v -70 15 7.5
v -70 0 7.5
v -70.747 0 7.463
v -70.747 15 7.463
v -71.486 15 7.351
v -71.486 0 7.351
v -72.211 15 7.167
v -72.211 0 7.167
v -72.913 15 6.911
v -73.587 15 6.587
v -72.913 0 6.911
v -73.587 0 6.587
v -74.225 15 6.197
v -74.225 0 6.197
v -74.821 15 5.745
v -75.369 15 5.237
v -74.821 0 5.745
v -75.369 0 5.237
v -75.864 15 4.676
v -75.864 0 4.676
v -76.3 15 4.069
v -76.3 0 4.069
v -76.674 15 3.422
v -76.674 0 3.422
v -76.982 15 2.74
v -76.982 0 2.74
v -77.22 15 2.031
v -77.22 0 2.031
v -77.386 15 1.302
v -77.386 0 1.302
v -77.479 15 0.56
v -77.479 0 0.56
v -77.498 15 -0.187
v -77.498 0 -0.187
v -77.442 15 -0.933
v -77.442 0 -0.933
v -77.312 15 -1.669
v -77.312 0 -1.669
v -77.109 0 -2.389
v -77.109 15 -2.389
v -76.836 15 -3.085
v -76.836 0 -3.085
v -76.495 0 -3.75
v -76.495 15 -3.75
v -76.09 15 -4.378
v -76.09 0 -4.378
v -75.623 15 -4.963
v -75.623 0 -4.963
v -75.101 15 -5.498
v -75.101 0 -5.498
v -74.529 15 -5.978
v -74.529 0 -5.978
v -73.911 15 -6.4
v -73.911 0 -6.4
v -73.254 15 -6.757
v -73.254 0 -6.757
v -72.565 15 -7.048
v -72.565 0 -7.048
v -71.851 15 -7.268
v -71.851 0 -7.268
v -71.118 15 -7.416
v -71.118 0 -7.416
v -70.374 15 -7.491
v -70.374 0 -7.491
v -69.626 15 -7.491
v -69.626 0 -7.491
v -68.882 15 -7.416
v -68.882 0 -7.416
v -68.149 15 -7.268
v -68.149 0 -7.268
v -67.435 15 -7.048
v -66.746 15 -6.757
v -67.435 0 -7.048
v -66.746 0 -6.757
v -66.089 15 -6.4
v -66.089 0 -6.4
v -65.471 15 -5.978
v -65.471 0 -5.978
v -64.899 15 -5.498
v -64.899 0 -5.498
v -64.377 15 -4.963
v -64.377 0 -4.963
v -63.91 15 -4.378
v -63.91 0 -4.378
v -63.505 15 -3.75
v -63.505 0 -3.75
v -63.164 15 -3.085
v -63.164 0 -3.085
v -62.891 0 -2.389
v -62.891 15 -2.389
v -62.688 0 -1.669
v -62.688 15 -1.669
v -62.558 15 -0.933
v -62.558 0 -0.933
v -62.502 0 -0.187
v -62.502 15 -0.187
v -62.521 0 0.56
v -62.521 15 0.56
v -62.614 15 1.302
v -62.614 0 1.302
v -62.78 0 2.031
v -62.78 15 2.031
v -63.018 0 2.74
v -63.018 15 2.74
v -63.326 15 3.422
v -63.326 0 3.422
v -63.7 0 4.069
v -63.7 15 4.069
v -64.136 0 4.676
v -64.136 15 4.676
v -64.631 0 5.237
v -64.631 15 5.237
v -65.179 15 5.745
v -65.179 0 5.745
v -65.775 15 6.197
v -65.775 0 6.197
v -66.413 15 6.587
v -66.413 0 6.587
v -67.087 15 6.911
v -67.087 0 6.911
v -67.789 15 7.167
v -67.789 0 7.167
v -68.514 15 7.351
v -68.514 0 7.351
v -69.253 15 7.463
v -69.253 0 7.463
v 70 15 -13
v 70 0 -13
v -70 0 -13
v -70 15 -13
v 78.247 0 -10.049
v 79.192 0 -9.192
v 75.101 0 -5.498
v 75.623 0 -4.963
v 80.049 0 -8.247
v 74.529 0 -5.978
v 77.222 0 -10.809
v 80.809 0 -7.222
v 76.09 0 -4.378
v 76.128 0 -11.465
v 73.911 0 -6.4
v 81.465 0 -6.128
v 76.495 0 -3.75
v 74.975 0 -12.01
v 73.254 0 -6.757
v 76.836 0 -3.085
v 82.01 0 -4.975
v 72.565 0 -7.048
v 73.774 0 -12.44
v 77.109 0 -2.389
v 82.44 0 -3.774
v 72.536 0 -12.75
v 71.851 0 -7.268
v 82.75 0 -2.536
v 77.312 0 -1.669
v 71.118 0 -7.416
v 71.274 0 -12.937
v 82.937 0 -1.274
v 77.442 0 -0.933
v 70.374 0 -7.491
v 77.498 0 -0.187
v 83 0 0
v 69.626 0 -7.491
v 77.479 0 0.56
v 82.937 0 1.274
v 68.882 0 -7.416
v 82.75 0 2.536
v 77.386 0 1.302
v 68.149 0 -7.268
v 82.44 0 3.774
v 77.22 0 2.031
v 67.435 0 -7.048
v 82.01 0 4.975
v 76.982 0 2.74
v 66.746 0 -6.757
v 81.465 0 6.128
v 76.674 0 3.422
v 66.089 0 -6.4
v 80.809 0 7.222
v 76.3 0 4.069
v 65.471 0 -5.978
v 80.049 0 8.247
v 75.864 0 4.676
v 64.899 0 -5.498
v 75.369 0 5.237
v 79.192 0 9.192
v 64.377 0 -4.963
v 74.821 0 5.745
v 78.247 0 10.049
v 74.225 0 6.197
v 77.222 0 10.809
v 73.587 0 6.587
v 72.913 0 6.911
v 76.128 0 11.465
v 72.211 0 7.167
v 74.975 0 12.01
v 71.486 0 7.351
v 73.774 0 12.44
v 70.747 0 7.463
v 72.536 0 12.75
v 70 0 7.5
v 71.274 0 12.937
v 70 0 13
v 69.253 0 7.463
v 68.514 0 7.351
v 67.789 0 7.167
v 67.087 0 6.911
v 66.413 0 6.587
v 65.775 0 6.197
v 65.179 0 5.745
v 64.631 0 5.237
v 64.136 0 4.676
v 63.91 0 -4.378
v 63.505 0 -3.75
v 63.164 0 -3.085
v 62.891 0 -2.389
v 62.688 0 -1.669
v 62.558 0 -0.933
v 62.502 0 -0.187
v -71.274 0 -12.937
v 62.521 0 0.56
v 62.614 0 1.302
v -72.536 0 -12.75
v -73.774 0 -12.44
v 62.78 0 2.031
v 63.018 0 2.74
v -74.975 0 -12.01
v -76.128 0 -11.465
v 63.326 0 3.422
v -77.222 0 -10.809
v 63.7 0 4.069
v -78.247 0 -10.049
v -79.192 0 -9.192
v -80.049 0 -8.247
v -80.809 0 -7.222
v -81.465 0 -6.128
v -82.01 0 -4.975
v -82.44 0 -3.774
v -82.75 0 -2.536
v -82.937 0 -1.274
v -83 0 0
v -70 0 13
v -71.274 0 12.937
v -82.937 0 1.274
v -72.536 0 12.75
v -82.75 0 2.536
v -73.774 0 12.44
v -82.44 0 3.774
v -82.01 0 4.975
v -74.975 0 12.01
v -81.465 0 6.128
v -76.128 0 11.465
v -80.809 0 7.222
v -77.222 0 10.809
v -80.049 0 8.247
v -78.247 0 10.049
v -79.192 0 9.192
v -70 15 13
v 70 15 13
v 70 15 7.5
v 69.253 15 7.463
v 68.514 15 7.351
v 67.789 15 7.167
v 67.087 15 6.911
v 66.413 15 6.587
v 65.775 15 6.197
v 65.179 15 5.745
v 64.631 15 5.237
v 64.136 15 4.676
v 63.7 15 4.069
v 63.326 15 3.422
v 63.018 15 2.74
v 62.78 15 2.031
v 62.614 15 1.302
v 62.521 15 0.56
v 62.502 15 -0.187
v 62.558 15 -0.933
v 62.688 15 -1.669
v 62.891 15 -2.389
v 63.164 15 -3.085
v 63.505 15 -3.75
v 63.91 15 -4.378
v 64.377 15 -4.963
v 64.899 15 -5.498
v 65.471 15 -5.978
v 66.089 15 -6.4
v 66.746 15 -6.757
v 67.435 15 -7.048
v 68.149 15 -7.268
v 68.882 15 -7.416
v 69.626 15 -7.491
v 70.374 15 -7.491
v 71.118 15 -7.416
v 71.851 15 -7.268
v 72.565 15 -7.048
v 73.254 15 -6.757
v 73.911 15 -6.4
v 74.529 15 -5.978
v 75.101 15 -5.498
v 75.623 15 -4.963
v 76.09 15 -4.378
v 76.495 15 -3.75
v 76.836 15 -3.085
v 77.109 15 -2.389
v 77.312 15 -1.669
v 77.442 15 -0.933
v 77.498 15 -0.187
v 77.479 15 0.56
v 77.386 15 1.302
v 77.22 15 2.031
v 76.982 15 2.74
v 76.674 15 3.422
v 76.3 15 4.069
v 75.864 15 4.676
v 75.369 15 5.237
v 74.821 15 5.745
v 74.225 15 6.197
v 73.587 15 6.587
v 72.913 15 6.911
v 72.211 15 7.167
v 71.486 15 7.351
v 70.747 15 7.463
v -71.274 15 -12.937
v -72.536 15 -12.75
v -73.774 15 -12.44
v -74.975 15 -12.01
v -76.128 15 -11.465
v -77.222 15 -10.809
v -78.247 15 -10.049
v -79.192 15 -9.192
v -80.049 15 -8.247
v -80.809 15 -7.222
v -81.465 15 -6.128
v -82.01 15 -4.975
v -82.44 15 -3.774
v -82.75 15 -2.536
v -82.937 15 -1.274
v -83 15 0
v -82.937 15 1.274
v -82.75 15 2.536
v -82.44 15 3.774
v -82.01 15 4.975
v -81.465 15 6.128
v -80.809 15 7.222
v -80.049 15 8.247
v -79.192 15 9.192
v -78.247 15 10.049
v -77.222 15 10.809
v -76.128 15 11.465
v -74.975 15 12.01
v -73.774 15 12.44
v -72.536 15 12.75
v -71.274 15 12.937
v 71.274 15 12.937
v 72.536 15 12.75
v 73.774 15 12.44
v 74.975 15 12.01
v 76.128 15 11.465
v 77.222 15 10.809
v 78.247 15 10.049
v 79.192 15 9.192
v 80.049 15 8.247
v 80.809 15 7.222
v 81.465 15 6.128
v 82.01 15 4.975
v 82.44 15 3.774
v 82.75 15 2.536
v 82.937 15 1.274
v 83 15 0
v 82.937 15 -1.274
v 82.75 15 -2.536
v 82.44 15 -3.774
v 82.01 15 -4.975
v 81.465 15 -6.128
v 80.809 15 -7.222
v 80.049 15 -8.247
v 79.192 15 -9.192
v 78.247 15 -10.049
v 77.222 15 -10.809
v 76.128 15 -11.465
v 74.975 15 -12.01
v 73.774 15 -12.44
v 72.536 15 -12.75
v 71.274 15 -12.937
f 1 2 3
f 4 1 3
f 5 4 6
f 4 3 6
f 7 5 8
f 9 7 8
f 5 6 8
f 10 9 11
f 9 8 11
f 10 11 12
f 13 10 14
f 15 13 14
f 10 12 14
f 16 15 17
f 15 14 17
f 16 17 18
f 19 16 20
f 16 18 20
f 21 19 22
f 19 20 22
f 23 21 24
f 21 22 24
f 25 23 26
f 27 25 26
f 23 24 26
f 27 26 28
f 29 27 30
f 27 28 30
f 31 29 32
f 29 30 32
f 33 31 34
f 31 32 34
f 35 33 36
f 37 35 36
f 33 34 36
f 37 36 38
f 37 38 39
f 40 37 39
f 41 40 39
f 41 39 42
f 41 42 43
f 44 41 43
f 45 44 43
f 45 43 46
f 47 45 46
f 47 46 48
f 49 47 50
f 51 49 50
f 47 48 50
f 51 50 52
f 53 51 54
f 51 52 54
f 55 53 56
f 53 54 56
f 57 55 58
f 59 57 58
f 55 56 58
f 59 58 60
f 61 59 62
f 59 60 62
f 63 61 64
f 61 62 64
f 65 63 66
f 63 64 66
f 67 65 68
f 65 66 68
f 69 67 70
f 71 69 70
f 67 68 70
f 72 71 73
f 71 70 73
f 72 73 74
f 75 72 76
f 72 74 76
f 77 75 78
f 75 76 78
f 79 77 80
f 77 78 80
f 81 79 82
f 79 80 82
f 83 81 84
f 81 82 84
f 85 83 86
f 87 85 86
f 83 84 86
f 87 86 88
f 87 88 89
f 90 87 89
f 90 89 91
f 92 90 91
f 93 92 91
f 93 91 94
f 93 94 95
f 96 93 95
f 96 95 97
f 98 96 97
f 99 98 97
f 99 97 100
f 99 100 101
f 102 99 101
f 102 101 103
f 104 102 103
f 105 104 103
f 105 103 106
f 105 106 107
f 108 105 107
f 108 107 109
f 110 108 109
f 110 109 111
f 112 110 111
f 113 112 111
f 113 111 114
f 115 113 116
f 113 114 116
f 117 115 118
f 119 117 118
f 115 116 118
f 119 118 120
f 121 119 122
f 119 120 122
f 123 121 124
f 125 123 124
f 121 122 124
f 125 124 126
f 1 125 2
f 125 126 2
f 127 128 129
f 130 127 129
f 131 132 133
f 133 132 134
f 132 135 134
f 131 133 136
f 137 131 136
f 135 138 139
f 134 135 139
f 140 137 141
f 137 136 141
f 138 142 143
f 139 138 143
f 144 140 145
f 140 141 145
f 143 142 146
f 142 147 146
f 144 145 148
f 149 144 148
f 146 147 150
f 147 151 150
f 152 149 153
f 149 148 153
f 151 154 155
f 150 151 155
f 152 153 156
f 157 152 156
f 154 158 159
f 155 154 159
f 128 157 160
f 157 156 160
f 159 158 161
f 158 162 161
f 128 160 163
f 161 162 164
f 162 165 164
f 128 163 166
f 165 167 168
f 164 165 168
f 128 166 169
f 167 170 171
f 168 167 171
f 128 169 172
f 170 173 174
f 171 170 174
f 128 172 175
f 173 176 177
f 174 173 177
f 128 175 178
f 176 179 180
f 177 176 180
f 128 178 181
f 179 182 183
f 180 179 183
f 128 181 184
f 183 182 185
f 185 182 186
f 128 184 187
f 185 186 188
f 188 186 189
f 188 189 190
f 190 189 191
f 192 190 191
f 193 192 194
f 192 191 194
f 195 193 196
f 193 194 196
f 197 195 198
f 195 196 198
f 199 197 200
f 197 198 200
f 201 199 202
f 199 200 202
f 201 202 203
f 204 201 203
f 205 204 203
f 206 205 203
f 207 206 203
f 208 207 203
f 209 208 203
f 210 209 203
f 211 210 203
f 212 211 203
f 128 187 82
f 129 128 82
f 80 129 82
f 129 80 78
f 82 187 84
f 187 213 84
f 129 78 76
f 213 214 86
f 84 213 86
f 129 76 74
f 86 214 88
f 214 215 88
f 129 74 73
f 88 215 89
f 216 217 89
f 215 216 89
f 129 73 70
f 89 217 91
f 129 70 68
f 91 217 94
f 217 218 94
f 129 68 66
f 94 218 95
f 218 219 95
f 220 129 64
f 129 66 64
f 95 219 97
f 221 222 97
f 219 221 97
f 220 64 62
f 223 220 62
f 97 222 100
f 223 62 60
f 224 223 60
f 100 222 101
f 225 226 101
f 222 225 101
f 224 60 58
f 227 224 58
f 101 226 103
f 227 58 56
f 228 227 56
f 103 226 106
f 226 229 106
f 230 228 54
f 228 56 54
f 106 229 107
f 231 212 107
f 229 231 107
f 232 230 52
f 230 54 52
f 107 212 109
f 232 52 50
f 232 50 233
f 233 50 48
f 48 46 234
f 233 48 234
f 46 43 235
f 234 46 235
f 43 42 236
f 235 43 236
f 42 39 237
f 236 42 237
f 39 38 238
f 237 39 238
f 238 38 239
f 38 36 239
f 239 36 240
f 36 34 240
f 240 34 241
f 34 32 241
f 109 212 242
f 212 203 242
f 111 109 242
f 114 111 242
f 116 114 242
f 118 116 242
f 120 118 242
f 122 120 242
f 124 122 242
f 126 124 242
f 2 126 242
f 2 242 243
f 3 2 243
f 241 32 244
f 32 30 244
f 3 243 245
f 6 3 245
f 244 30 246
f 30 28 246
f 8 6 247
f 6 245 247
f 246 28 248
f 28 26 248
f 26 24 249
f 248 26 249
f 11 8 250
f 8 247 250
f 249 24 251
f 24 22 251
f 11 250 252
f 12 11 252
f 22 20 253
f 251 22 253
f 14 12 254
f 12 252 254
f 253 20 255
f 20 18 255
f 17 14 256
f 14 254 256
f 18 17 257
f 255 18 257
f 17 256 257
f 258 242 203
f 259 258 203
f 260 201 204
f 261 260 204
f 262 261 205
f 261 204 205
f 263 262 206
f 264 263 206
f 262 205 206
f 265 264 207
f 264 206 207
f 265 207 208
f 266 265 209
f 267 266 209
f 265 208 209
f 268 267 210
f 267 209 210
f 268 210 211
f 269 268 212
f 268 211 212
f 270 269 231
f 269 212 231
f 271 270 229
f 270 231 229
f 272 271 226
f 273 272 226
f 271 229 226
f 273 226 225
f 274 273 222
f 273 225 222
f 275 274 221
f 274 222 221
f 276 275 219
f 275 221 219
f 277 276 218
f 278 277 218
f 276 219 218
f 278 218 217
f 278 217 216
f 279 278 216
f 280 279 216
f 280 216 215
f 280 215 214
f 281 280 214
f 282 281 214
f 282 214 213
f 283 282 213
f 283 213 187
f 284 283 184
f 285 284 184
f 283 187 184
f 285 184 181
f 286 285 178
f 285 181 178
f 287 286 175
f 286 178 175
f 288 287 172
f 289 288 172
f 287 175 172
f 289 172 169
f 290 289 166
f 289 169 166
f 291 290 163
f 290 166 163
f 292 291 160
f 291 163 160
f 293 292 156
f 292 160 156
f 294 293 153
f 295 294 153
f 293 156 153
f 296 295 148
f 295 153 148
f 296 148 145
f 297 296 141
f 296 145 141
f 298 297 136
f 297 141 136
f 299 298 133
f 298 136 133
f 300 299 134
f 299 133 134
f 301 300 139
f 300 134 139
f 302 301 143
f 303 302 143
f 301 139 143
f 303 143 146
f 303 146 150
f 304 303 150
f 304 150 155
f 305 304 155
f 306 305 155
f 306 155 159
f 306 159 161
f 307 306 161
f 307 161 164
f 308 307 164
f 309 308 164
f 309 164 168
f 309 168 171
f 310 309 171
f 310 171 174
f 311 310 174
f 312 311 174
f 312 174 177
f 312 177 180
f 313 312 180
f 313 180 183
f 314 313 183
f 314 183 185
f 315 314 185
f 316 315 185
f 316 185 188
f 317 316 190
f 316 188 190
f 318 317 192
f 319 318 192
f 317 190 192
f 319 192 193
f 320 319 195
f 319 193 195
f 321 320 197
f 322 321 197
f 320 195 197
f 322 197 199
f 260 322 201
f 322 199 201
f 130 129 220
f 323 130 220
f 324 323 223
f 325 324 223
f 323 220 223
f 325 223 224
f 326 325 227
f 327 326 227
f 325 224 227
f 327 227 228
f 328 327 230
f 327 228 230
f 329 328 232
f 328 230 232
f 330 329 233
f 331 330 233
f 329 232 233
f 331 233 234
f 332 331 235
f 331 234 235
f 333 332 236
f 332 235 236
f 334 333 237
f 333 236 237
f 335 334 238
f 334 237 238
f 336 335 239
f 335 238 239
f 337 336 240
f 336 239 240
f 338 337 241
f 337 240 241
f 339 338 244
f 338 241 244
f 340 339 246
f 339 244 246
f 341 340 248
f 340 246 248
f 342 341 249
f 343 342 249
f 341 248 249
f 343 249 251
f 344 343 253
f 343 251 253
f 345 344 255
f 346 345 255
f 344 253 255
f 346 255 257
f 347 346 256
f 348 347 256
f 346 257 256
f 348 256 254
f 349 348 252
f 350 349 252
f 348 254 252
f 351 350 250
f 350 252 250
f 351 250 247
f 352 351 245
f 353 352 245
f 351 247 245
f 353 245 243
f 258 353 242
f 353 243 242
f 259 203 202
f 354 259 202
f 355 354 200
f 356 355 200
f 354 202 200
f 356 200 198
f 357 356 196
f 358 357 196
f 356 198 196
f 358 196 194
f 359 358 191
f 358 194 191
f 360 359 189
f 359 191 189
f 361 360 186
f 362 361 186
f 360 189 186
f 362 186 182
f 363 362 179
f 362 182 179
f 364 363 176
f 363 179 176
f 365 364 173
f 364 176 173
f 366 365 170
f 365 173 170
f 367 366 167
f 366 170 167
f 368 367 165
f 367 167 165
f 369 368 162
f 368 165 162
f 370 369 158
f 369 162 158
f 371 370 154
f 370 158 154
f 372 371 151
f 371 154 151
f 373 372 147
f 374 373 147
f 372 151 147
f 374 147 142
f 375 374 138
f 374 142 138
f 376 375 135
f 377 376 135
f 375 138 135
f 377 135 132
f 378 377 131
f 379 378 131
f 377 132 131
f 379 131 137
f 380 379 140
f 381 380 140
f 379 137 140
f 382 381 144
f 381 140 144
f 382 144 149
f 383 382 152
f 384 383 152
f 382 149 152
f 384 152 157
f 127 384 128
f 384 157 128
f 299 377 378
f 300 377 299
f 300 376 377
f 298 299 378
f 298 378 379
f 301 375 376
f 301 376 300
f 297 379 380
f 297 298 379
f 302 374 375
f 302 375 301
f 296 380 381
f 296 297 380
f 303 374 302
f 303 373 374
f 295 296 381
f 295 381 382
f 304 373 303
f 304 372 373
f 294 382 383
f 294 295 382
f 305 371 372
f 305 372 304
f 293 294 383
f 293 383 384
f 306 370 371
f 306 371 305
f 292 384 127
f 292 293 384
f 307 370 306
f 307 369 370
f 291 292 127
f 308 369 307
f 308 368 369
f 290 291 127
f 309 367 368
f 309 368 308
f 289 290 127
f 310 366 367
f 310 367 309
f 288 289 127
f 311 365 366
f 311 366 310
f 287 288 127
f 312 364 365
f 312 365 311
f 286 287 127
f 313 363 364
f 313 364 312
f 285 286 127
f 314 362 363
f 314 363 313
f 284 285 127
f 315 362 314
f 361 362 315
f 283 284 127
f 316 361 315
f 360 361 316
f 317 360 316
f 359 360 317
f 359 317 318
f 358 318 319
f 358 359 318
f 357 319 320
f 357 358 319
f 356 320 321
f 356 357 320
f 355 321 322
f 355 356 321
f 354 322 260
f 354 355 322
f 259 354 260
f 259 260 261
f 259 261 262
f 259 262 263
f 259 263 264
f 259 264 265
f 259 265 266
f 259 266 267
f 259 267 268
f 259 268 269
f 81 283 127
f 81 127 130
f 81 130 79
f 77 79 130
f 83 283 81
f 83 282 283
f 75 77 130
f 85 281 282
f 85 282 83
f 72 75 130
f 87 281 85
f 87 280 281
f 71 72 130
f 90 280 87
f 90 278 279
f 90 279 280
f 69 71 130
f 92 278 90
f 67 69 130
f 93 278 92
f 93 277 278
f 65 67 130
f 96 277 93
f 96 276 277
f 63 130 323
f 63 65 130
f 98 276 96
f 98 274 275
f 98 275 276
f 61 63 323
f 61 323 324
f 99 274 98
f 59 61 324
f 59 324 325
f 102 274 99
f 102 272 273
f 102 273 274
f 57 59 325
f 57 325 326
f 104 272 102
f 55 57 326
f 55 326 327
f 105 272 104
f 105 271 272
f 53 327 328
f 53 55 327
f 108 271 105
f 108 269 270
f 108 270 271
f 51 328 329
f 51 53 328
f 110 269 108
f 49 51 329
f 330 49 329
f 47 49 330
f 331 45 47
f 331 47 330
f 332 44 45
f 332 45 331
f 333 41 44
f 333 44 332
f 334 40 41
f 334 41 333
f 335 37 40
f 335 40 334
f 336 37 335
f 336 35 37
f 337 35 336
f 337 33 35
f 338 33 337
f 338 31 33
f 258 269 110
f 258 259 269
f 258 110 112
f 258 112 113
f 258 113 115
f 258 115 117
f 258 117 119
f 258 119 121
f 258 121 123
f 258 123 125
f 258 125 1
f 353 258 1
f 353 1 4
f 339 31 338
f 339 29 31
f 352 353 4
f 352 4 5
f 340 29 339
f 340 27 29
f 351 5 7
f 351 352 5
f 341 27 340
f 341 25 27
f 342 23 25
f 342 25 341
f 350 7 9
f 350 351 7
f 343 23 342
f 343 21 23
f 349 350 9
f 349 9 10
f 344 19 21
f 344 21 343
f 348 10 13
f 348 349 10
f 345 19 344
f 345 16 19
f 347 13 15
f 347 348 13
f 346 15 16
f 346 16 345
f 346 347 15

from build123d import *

# Parameters (mm, degrees)
SKETCH1_R           = 7.5
BOSS_EXTRUDE1_DEPTH = 15


with BuildPart() as part:
    # Sketch1 → Boss-Extrude1 (new body)
    with BuildSketch(Plane.XZ):
        with BuildLine():
            Line((-70, 13), (70, 13))
            ThreePointArc((70, 13), (83, 0), (70, -13))
            Line((70, -13), (-70, -13))
            ThreePointArc((-70, -13), (-83, 0), (-70, 13))
        make_face()
        with Locations(Location((-70, 0, 0), (0, 0, 90))):
            Circle(SKETCH1_R, mode=Mode.SUBTRACT)
        with Locations(Location((70, 0, 0), (0, 0, 90))):
            Circle(SKETCH1_R, mode=Mode.SUBTRACT)
    extrude(amount=-BOSS_EXTRUDE1_DEPTH)


solid = part.part
